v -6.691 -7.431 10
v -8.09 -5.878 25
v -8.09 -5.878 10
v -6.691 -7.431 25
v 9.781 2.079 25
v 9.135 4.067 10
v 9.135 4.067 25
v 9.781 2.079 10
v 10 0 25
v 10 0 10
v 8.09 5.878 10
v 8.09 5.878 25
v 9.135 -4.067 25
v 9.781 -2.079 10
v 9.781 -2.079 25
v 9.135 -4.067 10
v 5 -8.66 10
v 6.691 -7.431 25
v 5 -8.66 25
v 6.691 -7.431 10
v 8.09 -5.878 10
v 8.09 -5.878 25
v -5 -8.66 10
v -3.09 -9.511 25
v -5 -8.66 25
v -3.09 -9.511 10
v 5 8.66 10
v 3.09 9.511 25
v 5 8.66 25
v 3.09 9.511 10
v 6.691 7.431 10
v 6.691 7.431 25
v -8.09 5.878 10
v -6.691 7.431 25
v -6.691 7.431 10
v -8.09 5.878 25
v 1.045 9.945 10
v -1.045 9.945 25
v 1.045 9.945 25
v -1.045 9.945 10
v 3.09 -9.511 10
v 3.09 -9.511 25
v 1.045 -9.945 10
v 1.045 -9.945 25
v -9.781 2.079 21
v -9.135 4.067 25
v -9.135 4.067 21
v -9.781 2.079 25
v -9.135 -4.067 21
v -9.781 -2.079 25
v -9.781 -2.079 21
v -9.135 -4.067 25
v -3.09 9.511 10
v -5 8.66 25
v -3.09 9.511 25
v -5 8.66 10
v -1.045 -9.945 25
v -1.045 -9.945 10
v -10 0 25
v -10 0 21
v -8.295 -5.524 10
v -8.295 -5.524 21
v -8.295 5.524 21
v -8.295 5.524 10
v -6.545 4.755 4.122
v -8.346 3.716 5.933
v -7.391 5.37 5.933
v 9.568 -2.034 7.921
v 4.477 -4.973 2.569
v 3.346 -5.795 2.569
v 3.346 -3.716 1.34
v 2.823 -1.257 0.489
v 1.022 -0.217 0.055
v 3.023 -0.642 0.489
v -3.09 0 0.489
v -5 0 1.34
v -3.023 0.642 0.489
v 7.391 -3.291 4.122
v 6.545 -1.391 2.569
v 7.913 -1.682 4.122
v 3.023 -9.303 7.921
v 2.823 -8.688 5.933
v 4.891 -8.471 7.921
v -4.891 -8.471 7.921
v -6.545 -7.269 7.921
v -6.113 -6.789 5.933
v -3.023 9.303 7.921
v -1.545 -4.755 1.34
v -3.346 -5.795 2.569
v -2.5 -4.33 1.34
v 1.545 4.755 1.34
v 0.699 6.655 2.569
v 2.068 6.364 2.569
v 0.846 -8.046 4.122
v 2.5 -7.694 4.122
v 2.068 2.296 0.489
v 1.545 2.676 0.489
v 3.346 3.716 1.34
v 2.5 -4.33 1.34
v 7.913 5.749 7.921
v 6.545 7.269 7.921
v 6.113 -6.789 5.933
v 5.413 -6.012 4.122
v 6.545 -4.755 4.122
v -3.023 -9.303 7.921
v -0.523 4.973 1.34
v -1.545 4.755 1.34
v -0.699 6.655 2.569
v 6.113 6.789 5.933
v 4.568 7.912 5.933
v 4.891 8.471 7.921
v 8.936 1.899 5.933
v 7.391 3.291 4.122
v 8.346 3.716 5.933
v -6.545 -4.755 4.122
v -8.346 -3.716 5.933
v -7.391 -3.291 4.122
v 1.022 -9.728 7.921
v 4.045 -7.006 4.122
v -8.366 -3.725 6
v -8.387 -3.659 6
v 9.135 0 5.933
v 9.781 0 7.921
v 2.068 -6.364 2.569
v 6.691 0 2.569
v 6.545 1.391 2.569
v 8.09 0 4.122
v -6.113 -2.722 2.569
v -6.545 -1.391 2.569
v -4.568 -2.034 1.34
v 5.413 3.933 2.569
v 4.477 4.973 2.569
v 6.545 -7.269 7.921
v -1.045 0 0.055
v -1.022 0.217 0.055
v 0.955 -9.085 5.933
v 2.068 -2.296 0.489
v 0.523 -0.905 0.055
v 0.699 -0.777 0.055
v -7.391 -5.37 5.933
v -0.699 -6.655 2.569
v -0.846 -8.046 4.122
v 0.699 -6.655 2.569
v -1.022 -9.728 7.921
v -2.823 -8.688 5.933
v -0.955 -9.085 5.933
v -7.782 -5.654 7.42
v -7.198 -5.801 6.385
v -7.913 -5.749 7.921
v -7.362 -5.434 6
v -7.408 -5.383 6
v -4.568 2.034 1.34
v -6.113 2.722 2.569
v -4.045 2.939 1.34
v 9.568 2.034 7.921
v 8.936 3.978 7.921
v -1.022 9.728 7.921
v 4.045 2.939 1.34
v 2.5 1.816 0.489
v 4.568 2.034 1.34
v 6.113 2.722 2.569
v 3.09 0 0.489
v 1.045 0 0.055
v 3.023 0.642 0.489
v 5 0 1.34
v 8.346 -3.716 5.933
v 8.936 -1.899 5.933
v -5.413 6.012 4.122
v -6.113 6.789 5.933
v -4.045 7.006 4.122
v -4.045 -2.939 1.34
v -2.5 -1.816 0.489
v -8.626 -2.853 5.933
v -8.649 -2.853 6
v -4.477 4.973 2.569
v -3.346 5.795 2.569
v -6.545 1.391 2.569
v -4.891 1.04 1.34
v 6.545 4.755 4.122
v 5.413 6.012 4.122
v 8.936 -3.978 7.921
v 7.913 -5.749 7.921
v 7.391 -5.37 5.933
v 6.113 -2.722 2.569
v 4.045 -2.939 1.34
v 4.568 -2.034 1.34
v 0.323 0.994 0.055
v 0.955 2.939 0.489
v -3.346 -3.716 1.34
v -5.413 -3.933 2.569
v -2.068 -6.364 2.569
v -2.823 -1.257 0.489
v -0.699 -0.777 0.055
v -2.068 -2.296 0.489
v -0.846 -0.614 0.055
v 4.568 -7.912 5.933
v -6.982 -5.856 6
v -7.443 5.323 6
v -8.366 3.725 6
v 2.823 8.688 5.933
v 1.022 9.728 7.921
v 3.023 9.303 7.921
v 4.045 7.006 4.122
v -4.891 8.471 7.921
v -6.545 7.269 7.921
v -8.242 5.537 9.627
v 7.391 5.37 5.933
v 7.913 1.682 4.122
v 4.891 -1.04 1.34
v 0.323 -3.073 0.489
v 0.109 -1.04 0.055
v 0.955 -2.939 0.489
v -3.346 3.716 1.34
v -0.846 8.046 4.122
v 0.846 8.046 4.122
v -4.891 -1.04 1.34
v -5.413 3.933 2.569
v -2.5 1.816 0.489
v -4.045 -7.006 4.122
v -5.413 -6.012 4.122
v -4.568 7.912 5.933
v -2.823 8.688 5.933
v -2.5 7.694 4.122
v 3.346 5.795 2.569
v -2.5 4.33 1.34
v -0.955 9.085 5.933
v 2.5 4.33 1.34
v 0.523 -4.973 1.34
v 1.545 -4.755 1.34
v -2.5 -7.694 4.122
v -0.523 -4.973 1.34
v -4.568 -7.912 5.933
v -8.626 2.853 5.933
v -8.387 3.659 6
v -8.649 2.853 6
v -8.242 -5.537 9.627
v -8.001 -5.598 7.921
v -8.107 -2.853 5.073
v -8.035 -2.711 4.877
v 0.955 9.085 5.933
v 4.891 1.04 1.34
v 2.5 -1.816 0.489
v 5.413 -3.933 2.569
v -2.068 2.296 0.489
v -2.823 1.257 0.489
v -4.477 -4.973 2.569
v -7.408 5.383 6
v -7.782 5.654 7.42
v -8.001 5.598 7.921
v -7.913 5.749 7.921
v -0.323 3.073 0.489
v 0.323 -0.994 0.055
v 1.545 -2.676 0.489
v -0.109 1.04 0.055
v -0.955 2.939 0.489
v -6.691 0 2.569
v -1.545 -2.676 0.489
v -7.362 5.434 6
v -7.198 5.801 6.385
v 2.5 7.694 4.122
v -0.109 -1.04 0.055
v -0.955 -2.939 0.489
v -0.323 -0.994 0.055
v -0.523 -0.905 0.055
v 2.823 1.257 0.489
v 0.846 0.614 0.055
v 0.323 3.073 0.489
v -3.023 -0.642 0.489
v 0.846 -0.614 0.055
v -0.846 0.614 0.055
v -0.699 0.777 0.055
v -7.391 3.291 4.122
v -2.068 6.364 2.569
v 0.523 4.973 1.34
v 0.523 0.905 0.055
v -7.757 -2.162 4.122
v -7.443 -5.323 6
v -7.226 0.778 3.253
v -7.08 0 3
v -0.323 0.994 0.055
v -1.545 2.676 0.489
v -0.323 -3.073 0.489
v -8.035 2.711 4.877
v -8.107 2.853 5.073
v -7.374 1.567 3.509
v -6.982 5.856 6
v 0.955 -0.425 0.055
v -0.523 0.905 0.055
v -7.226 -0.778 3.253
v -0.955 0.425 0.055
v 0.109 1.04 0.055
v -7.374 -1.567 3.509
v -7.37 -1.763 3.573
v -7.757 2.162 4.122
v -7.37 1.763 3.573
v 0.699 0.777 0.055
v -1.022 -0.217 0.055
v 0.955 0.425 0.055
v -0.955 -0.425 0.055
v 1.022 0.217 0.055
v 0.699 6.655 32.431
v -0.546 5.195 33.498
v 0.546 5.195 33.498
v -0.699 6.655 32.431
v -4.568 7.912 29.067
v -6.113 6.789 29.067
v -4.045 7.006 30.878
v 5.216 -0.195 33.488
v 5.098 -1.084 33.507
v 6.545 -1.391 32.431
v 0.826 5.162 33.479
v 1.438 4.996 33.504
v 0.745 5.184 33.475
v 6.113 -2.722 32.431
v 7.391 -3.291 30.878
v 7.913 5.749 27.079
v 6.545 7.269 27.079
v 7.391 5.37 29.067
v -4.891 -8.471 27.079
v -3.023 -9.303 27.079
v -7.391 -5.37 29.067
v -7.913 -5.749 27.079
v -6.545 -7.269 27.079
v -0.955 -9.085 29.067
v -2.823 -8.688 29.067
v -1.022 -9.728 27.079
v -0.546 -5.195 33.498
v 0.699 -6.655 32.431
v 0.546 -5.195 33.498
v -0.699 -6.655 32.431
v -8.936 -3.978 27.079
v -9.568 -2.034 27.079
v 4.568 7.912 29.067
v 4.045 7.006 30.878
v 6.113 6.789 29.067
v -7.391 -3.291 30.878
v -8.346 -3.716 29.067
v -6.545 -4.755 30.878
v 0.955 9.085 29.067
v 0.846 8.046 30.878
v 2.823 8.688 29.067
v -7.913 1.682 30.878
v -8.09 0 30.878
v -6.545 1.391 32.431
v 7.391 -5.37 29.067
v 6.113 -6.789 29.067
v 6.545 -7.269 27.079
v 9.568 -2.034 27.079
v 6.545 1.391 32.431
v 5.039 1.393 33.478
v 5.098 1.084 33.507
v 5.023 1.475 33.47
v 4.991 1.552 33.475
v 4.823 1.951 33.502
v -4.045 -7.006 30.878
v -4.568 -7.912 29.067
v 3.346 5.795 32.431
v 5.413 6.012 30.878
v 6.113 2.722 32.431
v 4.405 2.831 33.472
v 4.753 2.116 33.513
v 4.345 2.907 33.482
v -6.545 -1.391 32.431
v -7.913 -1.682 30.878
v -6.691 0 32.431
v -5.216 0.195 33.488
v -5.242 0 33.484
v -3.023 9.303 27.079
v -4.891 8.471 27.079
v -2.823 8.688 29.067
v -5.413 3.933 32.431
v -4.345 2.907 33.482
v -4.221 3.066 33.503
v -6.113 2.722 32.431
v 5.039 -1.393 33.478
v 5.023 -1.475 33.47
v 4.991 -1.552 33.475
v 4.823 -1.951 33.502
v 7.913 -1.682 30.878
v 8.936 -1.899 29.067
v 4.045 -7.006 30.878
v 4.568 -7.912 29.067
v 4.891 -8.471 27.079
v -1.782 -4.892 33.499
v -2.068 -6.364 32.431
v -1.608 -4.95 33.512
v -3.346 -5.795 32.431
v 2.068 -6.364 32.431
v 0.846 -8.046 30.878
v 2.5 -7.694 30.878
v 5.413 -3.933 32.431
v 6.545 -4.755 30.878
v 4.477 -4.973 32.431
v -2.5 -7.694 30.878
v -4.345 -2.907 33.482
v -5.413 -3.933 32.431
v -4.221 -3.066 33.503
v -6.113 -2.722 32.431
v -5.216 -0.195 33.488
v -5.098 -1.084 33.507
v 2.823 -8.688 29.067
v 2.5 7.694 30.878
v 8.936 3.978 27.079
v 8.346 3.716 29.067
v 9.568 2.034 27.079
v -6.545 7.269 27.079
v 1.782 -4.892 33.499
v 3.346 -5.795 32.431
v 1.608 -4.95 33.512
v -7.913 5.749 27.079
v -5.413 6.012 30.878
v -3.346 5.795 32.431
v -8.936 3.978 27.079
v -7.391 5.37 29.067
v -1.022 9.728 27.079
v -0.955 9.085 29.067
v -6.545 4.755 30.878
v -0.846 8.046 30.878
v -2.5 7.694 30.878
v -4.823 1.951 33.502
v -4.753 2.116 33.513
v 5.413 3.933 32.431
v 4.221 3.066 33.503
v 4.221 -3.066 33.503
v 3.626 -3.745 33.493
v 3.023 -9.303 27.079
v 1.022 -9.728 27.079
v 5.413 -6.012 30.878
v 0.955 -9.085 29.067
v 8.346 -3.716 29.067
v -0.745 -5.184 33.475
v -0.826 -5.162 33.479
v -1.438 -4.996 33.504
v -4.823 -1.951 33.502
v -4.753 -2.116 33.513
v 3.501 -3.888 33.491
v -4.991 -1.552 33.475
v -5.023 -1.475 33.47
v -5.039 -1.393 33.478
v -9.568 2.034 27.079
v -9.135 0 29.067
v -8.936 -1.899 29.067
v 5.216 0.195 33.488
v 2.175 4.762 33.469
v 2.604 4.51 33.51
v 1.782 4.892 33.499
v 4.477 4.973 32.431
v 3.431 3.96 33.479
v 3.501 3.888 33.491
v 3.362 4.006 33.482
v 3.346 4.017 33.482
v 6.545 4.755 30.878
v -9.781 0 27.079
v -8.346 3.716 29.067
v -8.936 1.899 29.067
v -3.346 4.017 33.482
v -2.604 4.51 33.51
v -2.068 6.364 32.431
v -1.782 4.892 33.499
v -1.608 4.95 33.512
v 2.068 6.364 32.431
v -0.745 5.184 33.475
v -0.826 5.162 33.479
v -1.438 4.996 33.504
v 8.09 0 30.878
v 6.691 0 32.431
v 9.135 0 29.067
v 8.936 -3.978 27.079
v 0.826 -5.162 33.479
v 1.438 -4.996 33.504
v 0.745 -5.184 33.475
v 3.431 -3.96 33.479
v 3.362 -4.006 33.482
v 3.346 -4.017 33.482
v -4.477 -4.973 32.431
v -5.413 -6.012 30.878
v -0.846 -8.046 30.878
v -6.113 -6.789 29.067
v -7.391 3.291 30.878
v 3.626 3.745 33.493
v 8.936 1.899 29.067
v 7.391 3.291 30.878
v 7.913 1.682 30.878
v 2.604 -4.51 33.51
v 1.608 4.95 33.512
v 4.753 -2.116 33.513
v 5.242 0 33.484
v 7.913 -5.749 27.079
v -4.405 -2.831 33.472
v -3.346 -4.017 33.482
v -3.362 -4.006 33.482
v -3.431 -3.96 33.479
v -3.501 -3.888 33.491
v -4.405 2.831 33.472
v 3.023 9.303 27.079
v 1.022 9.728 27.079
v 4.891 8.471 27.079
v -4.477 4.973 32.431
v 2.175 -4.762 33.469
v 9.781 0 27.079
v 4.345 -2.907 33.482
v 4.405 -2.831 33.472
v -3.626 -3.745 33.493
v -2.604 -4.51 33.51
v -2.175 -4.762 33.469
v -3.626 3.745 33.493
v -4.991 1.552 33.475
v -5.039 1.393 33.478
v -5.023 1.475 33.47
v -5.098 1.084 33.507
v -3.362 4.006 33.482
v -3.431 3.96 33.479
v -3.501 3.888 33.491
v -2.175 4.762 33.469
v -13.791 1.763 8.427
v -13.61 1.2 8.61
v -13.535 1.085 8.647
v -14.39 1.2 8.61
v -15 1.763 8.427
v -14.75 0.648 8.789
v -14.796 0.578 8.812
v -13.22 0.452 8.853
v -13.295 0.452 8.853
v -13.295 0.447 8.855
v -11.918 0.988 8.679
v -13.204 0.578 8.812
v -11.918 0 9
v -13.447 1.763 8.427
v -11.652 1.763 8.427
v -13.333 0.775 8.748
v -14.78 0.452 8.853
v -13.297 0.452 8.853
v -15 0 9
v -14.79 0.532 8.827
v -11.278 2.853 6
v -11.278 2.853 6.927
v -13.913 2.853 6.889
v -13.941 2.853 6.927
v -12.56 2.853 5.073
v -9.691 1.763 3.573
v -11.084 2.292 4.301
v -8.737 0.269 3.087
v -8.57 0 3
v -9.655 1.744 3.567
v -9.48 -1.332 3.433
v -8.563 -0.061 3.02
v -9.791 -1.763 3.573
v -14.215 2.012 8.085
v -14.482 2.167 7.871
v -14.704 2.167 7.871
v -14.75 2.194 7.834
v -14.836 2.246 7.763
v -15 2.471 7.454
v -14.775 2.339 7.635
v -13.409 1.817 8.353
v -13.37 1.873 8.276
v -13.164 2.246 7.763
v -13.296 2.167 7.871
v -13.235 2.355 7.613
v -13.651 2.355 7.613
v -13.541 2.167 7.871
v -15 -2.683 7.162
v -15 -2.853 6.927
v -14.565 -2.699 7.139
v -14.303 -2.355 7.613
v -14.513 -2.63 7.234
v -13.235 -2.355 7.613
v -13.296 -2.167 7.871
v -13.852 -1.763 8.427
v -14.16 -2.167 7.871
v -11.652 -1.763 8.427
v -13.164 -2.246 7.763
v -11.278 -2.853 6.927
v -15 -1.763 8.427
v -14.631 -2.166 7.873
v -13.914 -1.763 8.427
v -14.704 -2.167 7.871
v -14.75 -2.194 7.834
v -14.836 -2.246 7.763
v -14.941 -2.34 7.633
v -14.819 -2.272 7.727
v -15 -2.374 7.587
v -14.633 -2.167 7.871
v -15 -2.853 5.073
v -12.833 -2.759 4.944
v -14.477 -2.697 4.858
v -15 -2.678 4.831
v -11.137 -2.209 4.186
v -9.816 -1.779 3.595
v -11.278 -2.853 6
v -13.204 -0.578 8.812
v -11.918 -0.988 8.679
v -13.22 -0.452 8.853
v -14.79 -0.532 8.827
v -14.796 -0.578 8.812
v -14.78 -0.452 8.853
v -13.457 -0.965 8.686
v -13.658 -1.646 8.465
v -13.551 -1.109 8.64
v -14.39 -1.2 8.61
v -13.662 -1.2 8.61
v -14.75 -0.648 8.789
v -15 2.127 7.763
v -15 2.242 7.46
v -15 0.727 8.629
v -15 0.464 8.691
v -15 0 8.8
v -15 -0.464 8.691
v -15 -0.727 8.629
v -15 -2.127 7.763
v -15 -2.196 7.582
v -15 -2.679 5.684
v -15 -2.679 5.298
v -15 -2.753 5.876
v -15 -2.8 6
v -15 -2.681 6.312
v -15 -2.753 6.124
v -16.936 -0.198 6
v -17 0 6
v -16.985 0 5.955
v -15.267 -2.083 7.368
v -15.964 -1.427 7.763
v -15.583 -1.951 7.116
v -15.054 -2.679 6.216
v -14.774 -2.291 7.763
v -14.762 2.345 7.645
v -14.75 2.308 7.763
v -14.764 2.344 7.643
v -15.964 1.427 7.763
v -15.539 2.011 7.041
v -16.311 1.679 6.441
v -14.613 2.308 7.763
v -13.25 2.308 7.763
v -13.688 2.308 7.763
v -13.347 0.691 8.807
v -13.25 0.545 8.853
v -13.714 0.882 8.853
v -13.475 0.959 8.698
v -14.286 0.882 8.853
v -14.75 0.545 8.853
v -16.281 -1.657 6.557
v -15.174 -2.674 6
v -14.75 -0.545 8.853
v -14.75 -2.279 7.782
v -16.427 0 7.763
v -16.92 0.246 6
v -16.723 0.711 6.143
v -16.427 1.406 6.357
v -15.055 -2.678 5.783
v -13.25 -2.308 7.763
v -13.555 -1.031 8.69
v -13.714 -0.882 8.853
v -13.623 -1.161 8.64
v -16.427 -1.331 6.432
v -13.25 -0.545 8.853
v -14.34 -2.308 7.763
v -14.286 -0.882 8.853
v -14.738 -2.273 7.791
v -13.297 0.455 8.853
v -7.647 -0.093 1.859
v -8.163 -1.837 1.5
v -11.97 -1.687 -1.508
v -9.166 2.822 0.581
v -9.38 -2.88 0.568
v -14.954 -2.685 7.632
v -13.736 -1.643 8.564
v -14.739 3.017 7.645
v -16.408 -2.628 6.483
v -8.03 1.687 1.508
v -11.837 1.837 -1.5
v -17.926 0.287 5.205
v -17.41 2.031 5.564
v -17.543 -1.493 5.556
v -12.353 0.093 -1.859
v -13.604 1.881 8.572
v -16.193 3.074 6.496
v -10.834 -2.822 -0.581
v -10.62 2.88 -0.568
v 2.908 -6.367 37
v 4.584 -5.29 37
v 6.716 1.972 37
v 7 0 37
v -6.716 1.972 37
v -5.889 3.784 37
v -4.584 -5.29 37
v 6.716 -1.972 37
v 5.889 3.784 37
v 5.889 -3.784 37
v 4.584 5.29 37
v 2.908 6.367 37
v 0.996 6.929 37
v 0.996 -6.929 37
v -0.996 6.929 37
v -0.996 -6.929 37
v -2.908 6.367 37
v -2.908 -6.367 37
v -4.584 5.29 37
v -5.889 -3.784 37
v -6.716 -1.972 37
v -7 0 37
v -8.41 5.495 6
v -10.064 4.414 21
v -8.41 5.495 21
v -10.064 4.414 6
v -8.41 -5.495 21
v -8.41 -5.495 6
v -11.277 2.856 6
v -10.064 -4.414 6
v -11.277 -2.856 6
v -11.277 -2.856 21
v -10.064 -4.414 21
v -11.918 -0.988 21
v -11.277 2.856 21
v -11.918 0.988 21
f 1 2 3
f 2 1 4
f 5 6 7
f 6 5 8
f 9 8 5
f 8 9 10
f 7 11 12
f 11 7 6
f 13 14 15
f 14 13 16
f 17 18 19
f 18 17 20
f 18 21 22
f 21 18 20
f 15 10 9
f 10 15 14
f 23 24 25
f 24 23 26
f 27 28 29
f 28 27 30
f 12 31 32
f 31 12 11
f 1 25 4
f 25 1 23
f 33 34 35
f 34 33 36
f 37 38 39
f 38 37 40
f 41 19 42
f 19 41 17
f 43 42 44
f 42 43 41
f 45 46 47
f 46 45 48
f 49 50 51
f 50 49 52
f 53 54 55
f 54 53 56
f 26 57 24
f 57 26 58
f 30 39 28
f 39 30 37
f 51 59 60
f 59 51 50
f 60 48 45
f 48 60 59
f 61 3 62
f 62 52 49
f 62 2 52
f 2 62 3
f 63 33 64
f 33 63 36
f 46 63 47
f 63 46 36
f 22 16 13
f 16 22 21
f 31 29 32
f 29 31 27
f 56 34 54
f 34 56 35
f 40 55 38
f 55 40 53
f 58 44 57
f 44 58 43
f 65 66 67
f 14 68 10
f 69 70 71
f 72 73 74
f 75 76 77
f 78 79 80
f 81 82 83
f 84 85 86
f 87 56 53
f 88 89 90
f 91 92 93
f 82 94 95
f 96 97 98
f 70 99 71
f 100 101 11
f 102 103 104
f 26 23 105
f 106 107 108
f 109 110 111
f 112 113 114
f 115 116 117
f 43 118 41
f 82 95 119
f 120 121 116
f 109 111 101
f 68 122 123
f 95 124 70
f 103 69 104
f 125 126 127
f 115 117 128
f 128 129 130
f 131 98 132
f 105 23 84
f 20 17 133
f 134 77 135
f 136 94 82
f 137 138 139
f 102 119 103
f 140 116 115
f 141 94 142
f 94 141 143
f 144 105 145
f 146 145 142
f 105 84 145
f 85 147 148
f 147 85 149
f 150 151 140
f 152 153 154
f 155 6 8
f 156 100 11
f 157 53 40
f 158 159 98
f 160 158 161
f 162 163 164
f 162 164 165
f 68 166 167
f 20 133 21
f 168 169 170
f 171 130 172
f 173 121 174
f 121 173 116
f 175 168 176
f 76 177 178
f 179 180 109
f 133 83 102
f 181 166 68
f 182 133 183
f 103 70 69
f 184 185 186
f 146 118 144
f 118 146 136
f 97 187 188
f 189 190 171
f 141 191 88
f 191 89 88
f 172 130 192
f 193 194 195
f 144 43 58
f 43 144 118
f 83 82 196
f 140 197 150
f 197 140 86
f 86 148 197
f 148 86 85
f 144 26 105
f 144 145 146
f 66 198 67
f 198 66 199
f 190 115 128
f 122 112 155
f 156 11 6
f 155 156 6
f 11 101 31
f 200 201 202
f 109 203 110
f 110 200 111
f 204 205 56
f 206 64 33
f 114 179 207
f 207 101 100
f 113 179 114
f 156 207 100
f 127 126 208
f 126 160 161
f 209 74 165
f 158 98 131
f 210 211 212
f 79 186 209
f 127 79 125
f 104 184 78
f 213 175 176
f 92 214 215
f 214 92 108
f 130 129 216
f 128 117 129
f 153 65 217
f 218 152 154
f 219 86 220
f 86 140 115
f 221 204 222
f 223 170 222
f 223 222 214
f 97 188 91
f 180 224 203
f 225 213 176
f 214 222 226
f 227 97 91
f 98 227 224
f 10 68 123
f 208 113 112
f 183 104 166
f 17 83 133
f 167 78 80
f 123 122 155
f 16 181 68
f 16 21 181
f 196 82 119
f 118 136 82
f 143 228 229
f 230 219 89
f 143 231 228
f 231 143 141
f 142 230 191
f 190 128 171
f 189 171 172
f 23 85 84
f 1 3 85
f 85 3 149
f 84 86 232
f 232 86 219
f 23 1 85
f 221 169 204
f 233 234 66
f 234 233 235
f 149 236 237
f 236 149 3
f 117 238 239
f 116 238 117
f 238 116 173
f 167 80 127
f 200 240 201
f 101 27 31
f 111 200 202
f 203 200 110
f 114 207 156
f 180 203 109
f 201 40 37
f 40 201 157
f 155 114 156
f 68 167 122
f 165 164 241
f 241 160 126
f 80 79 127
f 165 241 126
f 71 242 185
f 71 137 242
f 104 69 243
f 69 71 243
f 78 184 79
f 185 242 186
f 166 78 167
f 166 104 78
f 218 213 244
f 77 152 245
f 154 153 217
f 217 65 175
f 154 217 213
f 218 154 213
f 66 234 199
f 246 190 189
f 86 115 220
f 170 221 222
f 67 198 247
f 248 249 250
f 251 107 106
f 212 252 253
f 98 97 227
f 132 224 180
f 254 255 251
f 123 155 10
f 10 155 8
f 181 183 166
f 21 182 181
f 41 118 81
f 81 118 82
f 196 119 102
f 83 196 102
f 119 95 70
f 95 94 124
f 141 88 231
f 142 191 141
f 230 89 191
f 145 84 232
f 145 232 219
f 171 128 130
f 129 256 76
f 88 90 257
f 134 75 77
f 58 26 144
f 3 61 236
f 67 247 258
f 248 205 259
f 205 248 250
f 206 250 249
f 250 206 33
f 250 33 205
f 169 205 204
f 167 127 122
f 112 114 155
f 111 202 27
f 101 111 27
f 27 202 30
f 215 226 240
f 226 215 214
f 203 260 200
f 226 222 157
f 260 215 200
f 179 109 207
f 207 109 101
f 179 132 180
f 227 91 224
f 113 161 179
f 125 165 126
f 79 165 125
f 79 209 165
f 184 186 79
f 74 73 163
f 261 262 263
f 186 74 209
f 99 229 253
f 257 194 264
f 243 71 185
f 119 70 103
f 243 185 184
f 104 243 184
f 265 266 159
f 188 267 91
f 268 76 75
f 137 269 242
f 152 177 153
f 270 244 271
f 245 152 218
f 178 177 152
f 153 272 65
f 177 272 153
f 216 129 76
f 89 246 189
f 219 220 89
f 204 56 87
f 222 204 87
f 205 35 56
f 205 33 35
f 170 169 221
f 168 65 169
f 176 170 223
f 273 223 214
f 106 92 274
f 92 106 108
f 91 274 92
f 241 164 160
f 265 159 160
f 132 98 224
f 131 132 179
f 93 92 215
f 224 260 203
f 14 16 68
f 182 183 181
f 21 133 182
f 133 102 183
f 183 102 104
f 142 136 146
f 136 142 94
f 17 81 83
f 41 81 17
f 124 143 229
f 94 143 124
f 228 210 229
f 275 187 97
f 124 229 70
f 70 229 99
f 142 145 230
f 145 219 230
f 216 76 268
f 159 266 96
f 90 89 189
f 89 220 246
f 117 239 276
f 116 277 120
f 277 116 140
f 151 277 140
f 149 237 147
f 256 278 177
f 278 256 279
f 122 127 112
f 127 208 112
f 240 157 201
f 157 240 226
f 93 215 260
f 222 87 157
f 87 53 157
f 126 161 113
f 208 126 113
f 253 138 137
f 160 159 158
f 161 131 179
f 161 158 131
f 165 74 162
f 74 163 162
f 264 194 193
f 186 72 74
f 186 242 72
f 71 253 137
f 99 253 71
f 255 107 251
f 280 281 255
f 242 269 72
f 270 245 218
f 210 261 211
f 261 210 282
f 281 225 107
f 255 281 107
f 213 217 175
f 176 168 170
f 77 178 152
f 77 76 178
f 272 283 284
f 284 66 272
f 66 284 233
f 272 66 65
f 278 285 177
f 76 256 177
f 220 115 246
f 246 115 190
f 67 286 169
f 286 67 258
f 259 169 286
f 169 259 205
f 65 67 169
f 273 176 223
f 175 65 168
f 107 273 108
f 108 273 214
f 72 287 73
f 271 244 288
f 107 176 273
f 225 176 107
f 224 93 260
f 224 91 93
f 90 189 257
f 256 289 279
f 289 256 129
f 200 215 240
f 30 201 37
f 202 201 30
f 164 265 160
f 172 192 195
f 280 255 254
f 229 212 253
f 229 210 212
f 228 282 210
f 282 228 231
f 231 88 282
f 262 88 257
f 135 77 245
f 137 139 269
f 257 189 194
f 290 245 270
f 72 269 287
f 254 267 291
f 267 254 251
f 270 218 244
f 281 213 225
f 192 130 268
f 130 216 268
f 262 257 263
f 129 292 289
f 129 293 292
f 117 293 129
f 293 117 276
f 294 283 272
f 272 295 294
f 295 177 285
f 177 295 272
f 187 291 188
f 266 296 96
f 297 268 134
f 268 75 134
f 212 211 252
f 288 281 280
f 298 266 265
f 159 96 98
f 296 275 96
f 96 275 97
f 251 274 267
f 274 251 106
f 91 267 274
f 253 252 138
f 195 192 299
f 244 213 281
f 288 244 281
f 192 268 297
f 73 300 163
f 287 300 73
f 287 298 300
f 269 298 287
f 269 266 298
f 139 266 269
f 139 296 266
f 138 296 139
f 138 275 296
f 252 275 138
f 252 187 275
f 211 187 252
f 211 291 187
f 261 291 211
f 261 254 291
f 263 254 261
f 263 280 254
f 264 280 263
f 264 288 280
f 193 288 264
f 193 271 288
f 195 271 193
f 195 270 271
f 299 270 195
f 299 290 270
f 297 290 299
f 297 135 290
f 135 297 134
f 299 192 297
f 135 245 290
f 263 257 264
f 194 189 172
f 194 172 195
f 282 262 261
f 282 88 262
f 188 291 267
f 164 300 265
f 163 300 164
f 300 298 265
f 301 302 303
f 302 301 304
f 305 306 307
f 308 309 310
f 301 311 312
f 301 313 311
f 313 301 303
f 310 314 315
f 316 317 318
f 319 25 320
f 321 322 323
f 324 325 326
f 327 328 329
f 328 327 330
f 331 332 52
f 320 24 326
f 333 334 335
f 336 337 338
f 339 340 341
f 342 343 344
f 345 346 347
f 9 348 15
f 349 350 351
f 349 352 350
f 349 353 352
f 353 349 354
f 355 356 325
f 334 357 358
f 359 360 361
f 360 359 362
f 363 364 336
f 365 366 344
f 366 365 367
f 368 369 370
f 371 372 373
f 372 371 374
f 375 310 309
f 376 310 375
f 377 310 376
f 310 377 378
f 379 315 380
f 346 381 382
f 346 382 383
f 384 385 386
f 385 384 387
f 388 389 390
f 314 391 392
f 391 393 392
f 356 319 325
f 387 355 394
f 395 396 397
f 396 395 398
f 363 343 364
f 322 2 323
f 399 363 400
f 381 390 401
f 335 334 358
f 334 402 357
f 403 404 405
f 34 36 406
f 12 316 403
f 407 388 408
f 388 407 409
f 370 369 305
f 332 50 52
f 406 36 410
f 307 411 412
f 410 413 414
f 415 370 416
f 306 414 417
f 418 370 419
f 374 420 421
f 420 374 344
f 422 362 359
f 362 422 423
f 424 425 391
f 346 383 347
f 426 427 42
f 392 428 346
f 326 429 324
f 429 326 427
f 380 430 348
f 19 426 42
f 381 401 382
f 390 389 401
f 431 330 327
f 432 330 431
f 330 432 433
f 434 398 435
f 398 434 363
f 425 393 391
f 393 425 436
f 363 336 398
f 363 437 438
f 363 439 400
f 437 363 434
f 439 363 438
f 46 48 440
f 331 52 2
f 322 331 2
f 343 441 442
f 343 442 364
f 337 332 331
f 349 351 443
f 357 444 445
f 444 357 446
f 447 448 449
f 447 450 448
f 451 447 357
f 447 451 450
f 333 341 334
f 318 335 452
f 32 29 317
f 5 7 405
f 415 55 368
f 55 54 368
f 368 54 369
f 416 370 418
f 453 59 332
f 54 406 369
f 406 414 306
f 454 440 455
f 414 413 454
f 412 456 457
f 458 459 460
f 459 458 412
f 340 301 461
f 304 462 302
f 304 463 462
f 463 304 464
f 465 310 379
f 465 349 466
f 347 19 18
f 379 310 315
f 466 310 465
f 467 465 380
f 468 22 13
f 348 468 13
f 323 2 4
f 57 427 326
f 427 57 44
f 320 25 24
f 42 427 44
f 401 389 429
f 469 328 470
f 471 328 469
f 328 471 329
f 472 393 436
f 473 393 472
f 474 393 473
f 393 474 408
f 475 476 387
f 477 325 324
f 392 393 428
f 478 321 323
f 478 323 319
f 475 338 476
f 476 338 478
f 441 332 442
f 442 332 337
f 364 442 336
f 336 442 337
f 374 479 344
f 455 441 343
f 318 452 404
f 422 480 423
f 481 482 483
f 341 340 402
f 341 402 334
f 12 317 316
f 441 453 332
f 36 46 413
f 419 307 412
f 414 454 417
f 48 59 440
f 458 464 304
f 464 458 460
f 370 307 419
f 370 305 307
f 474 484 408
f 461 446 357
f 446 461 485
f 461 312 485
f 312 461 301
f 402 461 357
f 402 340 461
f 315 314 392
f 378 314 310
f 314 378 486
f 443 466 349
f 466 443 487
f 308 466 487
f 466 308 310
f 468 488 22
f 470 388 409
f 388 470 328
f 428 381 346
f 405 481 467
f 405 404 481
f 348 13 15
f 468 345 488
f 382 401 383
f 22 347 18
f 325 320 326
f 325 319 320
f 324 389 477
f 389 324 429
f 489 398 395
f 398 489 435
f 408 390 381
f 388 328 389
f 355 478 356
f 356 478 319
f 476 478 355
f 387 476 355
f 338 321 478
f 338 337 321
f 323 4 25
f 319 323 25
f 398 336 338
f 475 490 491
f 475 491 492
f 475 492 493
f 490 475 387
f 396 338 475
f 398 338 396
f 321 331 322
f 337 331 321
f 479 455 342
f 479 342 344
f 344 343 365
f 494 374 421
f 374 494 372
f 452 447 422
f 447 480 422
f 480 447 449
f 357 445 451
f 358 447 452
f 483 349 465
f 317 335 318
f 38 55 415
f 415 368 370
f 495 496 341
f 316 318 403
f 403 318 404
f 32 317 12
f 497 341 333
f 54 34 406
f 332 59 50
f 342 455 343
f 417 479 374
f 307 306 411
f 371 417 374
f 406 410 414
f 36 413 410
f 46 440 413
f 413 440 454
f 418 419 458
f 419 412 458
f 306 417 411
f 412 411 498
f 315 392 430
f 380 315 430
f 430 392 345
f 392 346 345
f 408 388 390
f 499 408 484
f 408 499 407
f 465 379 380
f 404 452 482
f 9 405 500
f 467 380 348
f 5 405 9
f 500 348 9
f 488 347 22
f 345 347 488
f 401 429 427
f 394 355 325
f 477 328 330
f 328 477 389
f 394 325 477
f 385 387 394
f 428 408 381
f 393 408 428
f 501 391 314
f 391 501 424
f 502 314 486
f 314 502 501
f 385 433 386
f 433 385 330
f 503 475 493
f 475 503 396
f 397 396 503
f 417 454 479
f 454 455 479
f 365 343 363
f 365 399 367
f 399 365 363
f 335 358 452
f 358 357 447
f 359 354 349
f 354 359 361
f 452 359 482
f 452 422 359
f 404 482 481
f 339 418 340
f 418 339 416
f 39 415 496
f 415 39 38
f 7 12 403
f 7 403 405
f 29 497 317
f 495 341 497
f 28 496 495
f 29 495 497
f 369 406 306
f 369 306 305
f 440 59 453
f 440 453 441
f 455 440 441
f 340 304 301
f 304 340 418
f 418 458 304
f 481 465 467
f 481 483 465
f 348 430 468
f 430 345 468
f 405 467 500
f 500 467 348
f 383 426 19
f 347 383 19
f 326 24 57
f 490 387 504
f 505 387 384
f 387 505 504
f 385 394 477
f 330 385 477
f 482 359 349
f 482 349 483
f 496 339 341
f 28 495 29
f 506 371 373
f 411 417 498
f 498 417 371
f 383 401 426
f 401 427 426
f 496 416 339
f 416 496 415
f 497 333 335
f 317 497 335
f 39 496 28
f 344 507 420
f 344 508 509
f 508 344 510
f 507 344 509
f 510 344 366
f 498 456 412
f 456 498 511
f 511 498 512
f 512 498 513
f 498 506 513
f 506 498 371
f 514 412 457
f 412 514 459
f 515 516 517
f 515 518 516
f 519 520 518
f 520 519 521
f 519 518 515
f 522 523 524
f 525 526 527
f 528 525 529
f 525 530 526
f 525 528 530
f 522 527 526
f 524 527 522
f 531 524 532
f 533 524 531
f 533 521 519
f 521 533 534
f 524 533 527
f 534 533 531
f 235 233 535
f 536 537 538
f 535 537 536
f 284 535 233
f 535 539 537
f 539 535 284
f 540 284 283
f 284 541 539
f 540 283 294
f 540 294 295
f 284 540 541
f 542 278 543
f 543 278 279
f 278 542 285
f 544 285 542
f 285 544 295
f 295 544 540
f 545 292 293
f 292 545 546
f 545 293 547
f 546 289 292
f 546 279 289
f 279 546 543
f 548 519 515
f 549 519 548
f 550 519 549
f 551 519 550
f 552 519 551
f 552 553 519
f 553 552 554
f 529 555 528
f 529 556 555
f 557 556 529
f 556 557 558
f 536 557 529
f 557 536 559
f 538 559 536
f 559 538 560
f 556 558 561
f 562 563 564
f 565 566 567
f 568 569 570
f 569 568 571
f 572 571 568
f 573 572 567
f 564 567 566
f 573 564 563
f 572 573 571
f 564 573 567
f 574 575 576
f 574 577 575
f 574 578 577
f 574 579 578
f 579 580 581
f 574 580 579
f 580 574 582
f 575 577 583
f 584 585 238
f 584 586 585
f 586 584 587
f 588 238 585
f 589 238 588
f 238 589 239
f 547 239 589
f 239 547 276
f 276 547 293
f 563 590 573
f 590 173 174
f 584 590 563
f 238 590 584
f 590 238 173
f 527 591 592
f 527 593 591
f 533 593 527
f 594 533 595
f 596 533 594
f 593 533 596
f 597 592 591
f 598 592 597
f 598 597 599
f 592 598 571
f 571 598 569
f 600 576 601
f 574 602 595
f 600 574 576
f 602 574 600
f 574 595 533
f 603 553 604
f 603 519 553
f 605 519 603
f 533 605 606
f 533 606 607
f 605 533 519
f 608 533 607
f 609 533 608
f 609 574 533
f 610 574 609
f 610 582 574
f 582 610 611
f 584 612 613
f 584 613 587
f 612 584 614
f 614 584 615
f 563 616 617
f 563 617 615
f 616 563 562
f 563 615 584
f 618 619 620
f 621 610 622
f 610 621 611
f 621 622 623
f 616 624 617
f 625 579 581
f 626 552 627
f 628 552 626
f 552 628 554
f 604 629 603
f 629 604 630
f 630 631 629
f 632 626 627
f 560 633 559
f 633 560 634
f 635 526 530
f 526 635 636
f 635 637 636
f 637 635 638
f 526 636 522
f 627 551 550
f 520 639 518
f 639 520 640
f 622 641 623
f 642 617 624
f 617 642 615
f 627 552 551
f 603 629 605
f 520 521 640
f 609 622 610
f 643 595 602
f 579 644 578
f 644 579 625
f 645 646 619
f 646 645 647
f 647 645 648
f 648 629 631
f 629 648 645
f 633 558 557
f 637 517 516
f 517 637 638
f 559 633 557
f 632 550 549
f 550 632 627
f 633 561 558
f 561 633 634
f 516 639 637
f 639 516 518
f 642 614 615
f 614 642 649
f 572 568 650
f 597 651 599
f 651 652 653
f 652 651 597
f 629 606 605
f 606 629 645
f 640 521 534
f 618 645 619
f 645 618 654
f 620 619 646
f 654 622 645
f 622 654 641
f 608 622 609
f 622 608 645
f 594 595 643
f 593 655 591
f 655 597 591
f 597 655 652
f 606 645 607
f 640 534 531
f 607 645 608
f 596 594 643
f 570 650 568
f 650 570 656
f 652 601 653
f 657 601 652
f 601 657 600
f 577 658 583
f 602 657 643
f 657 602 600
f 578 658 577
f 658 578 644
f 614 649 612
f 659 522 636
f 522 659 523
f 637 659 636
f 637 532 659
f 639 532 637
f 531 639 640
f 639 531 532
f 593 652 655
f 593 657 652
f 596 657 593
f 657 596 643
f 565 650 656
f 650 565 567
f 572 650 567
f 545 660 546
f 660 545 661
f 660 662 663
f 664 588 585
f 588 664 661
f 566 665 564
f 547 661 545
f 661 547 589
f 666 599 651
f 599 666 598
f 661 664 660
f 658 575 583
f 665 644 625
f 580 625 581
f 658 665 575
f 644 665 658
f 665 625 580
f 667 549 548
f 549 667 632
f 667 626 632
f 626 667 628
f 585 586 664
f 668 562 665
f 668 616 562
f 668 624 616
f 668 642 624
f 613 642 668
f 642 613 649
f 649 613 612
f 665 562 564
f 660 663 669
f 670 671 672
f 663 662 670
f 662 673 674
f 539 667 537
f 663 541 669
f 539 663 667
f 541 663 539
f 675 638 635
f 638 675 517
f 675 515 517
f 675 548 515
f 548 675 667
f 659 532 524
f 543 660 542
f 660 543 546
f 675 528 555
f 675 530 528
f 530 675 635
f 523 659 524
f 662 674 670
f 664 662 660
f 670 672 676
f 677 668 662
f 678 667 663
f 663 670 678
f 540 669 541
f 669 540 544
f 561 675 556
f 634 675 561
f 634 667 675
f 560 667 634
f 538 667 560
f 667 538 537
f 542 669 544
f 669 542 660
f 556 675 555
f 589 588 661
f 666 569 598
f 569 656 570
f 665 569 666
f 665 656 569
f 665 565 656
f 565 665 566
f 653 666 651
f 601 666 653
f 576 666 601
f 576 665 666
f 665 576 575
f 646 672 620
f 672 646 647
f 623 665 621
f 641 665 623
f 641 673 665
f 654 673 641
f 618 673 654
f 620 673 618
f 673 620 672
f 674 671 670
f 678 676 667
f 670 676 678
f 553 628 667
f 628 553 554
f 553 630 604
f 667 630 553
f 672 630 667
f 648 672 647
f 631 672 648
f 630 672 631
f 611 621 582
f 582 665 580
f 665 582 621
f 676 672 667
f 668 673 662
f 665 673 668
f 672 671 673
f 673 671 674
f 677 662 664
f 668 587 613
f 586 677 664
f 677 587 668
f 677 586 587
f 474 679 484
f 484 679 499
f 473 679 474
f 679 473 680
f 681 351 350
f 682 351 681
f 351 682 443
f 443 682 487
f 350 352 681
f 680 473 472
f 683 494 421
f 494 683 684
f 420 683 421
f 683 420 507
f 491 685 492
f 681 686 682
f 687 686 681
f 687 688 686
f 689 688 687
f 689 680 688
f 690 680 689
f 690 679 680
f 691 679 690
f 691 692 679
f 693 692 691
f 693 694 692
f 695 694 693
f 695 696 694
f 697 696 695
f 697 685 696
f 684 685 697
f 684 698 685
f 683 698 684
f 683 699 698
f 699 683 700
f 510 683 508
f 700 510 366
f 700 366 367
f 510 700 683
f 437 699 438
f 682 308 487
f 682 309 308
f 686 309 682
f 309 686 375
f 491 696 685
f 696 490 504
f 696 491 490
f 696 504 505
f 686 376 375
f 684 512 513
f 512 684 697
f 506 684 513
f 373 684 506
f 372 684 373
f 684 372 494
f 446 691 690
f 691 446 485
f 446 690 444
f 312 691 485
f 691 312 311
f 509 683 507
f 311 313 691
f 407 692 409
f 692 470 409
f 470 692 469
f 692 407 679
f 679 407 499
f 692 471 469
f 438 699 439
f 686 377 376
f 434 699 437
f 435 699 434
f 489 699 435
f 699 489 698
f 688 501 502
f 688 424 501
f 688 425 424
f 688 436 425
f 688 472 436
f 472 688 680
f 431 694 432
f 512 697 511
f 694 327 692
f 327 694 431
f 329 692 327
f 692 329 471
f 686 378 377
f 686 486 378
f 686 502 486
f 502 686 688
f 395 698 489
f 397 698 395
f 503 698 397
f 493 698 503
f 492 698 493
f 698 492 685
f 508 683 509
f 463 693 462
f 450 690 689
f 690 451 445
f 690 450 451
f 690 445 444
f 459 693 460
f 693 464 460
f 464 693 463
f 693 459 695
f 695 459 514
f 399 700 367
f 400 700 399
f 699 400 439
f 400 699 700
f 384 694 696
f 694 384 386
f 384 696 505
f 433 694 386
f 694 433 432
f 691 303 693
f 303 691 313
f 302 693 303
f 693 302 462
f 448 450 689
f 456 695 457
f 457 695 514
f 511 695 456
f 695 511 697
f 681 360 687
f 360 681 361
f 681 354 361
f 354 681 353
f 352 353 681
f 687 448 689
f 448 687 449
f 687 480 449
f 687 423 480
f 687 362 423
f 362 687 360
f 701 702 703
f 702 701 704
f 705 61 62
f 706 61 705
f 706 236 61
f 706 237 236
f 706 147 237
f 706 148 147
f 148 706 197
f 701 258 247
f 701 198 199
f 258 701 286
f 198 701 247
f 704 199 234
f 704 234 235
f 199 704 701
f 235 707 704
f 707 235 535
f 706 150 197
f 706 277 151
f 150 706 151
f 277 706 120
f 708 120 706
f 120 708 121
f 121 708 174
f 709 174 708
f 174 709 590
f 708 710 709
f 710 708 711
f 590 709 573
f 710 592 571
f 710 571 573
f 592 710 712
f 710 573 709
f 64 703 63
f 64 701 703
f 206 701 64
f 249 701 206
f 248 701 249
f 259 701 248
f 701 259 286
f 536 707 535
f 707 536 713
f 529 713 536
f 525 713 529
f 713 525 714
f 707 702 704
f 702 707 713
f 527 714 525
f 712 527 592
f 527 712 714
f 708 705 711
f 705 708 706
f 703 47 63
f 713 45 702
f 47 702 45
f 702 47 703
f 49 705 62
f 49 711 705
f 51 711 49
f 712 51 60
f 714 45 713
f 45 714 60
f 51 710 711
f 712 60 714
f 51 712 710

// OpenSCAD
//корпус
translate([0, 0, 10])
cylinder(15, 10, 10);
translate([0, 0, 10])
sphere(10);
translate([-0, -0, 25])
sphere(10);

//труба
translate([-6, -0, 6])
rotate([-90, -90, 90])
cylinder(9, 3, 3);
translate([-14, -0, 6])
sphere(3);

//другая труба
translate([-10, 0, -0])
rotate([25, -30, -45])
cylinder(9, 3, 3);

//хвост
translate([0, -0, 25])
cylinder(12, 1, 7);

//второй корпус
translate([-6, -0, 6])
cylinder(15, 6, 6);
